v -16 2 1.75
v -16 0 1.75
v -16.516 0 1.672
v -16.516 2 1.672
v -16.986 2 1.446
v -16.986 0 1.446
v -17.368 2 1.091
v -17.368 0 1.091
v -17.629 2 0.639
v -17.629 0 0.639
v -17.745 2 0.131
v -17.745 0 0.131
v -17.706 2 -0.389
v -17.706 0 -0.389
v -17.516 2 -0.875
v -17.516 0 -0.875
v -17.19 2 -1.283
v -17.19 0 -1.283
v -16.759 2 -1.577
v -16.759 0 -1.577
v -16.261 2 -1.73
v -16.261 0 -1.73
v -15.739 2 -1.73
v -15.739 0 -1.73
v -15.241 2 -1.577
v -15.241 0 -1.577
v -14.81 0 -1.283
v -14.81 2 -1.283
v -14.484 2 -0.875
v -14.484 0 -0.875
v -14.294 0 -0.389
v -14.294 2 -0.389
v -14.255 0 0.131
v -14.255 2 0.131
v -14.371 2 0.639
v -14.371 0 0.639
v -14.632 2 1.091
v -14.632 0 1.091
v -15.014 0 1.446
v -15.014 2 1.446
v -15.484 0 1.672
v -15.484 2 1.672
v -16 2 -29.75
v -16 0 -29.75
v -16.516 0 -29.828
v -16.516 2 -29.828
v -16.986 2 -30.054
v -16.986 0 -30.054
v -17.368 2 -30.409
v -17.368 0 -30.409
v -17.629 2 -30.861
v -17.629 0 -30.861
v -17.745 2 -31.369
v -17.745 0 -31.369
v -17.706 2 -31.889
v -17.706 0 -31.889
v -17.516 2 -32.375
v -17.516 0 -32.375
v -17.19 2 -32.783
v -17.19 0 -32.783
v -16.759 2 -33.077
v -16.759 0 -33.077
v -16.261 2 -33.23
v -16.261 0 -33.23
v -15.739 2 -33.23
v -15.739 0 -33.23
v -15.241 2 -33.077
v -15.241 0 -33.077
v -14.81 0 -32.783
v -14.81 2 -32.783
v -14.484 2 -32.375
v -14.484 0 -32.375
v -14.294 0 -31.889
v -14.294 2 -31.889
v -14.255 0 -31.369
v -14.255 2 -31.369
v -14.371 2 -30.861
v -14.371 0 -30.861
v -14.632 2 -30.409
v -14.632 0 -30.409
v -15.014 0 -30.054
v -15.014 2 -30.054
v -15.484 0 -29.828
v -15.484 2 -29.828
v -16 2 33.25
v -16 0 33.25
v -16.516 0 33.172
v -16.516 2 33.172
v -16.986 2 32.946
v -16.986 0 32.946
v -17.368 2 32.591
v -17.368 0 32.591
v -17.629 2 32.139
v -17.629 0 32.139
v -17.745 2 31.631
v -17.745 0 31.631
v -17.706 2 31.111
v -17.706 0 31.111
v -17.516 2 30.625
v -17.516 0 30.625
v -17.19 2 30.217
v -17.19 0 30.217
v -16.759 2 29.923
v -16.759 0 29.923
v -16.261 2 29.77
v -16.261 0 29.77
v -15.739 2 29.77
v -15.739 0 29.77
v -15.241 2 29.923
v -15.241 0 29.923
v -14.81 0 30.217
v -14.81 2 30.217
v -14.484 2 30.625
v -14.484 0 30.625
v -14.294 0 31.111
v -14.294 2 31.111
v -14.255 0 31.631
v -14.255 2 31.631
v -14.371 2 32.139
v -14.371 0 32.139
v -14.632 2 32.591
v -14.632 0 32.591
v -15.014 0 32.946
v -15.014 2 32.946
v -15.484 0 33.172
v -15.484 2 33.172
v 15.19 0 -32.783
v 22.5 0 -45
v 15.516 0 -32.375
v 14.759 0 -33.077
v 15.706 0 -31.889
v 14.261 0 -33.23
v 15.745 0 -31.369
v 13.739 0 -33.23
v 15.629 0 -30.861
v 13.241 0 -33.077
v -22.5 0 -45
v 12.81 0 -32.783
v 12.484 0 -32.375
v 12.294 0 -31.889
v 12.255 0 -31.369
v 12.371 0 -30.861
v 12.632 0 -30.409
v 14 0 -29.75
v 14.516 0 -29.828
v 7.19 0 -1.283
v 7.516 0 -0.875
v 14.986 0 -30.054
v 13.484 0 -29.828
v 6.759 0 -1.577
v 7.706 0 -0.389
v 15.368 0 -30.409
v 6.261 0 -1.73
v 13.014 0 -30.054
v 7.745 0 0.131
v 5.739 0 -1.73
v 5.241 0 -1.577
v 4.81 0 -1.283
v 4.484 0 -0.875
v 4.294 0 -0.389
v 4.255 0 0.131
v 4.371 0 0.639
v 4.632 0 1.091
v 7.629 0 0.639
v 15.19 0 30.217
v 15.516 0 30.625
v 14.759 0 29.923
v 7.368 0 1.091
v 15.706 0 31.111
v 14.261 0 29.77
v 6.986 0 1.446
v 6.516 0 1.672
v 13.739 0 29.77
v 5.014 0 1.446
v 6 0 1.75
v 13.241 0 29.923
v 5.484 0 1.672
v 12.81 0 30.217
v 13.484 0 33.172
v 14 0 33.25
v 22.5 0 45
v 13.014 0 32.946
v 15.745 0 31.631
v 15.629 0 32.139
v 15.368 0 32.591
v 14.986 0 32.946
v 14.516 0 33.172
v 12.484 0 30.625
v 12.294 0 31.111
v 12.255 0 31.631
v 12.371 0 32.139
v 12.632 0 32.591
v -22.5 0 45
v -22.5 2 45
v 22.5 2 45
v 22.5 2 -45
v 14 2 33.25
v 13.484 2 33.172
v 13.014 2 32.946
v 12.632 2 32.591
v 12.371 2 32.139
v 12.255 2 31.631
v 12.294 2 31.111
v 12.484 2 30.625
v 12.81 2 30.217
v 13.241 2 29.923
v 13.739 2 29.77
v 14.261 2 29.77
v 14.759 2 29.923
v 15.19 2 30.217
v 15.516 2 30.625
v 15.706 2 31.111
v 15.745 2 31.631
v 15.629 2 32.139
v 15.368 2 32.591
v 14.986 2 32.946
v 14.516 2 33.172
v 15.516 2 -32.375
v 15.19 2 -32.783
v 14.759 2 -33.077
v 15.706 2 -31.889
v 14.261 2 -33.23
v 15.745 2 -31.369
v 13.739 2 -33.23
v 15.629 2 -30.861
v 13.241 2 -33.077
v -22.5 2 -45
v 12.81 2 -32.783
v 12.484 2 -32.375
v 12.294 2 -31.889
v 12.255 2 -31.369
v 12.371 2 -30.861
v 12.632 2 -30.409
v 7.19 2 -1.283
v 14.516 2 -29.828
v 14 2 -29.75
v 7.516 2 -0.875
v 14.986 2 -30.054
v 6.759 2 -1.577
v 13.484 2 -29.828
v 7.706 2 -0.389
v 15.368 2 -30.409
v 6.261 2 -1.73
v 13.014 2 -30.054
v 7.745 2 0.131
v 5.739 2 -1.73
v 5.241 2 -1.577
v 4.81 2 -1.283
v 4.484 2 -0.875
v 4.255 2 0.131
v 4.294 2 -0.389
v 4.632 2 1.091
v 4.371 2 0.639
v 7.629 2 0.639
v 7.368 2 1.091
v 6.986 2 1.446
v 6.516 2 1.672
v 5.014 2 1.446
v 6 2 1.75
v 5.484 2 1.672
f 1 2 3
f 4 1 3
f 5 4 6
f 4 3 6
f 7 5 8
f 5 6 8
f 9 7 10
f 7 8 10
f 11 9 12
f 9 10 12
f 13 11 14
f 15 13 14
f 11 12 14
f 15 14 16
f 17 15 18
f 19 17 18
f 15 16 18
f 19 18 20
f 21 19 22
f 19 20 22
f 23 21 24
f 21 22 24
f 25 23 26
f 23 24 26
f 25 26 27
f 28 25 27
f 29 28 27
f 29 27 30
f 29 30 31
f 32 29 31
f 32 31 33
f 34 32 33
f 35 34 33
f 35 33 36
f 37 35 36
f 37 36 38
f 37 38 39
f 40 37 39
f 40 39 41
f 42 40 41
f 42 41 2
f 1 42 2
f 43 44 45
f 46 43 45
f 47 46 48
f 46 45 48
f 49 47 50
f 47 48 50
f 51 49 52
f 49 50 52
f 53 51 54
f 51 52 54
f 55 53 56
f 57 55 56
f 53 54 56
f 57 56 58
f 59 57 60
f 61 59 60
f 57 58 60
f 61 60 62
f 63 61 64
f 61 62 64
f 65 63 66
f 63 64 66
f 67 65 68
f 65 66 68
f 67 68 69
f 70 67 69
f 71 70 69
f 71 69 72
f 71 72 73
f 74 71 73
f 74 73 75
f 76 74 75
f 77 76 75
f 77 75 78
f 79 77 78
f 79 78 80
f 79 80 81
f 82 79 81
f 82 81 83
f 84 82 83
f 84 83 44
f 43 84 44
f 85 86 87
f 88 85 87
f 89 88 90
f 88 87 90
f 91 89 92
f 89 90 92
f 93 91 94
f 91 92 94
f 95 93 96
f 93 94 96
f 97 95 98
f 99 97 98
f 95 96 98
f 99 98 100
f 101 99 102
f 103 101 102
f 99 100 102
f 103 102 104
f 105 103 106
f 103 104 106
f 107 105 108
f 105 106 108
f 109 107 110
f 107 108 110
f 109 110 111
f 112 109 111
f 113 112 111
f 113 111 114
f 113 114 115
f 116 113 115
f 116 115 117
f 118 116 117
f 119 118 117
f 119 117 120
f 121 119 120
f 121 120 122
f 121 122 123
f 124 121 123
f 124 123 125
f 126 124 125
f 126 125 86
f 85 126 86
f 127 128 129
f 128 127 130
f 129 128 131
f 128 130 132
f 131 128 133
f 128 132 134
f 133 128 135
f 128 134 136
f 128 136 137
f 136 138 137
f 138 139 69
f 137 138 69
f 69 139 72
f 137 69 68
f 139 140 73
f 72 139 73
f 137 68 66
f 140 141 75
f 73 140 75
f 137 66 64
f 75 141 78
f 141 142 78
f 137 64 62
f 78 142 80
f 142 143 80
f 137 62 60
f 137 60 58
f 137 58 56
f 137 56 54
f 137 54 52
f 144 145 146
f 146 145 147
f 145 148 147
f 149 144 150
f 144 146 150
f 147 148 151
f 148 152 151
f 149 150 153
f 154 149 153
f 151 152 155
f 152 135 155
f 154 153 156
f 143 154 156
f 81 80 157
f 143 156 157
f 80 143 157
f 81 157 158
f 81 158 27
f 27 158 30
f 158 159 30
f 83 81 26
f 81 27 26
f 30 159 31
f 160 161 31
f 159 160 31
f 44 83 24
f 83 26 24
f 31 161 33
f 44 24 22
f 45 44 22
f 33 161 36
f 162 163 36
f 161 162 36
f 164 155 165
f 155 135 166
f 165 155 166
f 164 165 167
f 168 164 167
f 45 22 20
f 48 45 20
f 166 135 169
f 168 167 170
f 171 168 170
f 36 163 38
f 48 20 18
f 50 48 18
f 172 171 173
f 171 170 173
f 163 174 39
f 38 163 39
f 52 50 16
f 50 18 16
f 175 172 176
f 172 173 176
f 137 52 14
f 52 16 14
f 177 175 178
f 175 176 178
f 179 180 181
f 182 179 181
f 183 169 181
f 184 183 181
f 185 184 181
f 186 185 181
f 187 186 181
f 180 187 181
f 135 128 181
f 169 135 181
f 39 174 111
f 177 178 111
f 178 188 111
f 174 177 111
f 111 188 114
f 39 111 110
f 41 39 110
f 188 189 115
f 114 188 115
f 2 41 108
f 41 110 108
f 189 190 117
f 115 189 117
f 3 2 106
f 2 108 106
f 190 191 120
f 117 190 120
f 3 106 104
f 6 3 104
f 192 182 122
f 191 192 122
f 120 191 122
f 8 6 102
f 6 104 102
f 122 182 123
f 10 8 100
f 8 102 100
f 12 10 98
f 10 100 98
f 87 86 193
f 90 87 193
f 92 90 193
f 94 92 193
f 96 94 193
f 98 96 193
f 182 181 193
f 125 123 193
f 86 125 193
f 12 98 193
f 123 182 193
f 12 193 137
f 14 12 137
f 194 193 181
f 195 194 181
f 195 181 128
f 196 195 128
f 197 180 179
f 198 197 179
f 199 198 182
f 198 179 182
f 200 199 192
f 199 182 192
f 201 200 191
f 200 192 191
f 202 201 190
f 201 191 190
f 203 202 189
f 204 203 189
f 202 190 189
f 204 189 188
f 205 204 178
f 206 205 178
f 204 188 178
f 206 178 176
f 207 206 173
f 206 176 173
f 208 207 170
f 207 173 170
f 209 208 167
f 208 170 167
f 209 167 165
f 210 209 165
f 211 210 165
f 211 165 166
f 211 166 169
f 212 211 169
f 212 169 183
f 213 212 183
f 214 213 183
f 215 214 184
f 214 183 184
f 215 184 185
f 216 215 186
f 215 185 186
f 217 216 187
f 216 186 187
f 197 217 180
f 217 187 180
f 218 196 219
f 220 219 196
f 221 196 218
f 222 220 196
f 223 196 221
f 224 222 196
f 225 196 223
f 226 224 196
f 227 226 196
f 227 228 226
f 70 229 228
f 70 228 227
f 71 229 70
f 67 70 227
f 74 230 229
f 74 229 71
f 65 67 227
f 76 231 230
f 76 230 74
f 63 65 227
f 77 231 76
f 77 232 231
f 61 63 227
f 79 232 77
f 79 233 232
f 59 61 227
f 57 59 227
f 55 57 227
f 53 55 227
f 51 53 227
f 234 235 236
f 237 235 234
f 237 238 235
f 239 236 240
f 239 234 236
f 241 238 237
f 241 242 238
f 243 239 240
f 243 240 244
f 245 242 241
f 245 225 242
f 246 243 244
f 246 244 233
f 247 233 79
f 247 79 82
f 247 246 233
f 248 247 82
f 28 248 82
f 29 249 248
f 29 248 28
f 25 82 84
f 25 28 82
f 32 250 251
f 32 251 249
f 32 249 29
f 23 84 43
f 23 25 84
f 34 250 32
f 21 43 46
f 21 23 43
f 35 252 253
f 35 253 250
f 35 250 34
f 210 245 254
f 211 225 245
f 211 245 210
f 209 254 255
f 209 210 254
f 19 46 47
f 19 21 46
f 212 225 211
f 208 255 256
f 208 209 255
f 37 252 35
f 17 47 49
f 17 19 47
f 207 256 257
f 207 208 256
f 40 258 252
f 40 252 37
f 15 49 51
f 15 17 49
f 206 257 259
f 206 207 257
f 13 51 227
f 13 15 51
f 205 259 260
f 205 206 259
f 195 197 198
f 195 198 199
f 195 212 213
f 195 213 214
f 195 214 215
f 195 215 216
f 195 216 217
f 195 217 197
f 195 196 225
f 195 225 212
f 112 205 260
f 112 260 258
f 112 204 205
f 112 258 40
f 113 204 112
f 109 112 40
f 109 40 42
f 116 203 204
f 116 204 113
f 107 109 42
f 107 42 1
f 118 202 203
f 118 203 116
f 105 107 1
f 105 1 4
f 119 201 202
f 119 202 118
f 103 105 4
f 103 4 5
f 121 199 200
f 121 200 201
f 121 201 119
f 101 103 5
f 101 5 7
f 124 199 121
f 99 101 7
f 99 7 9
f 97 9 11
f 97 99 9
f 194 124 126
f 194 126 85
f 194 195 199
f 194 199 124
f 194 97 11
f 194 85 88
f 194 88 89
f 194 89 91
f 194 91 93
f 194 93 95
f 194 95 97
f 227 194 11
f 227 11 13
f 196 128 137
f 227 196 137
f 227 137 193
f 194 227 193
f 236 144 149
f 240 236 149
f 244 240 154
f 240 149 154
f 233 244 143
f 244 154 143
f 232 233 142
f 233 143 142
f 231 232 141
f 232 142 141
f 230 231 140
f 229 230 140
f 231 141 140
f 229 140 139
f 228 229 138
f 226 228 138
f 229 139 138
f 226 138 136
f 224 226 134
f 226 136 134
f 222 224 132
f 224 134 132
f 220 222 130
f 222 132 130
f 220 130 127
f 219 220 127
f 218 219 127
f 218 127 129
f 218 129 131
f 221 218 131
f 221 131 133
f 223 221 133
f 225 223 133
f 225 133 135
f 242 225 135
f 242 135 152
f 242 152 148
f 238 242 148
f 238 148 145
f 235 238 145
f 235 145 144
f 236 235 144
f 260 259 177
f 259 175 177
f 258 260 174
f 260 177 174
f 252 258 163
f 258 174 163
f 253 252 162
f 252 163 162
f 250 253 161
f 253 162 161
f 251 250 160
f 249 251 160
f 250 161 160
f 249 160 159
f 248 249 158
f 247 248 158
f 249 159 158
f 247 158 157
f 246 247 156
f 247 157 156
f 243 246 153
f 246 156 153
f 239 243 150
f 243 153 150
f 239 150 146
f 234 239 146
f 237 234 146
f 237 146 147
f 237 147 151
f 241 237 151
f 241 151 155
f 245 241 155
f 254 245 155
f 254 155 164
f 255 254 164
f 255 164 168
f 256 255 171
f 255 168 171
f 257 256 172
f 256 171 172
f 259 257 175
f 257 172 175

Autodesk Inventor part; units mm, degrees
ref_plane "YZ Plane" through (0, 0, 0) normal (1, 0, 0) x (0, 1, 0)
ref_plane "XZ Plane" through (0, 0, 0) normal (0, 1, 0) x (-1, 0, 0)
ref_plane "XY Plane" through (0, 0, 0) normal (0, 0, 1) x (1, 0, 0)
sketch "Szkic1" plane through (0, 0, 0) normal (0, 1, 0) x (-1, 0, 0)
  line L0 (-22.5, -45) -> (22.5, -45)
  line L1 (22.5, -45) -> (22.5, 45)
  line L2 (22.5, 45) -> (-22.5, 45)
  line L3 (-22.5, 45) -> (-22.5, -45)
  line L4 (-22.5, -45) -> (22.5, 45) construction
  line L5 (22.5, -45) -> (-22.5, 45) construction
  point P0 (0, 0)
  dimension "d0" = 45
  dimension "d1" = 90
extrude "Wyciągnięcie proste1" add sketch "Szkic1" along normal blind 2
sketch "Szkic2" plane through (0, 2, 0) normal (0, 1, 0) x (1, 0, 0)
  line L0 (11.5, 3.5) -> (18.5, 3.5) projected
  line L1 (18.5, 3.5) -> (18.5, 35.5) projected
  line L2 (18.5, 35.5) -> (-20.5, 35.5) projected
  line L3 (-20.5, 35.5) -> (-20.5, -35.5) projected
  line L4 (-20.5, -35.5) -> (18.5, -35.5) projected
  line L5 (18.5, -35.5) -> (18.5, -26.5) projected
  line L6 (18.5, -26.5) -> (11.5, -26.5) projected
  line L7 (11.5, -26.5) -> (11.5, 3.5) projected
  circle A0 centre (6, 0) radius 1.5 projected
  circle A1 centre (14, 31.5) radius 1.5 projected
  circle A2 centre (-16, -31.5) radius 1.5 projected
  circle A3 centre (-16, 31.5) radius 1.5 projected
  circle A4 centre (14, -31.5) radius 1.5 projected
  circle A5 centre (-16, 0) radius 1.5 projected
  point P0 (0, 0)
hole "Otwór1" at (14, 2, -31.5) at (6, 2, 0) at (14, 2, 31.5) at (-16, 2, 31.5) at (-16, 2, 0) at (-16, 2, -31.5) direction (0, -1, 0) diameter 3.5 end through all
properties part number "blacha pionowa"
